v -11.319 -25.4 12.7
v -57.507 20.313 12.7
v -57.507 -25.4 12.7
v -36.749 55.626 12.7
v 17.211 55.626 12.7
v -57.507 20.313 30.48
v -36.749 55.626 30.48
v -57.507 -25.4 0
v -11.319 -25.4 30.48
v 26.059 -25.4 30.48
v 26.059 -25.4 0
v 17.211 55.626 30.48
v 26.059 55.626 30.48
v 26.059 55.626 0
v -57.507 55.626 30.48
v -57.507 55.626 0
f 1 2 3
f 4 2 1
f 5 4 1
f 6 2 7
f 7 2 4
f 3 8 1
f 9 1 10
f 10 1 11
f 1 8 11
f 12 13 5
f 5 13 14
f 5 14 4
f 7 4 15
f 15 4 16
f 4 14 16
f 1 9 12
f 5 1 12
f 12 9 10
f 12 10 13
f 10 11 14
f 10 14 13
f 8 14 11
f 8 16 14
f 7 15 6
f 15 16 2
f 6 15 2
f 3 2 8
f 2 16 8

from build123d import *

# Parameters (mm, degrees)
F0_W      = 50.8
F0_H      = 30.48
F1_DEPTH  = 25.4
F2_DEPTH  = 55.626
F3_DEPTH  = 32.766
F6_DEPTH  = 25.4
F7_DEPTH  = 25.4
F9_DEPTH  = 25.4
F10_DEPTH = 7.62


with BuildPart() as f1:
    # F0 (on Front) → F1 (new body)
    with BuildSketch(Plane.XZ):
        with Locations((-32.1067409651, 15.24)):
            Rectangle(F0_W, F0_H)
    extrude(amount=F1_DEPTH)

    # F2 (add): a face of the model
    f2_faces = [f1.faces().sort_by_distance(p)[0] for p in [
        (-32.1067409651, 0, 15.24),
    ]]
    extrude(f2_faces, amount=F2_DEPTH)

    # F3 (add): a face of the model
    f3_faces = [f1.faces().sort_by_distance(p)[0] for p in [
        (-6.7067409651, 15.113, 15.24),
    ]]
    extrude(f3_faces, amount=F3_DEPTH)

    # F4 (on face) → F6 (cut)
    with BuildSketch(Plane.XY.offset(30.48)):
        Polygon((-11.3192433491, -25.4), (17.2114539891, 55.626), (-57.5067409651, 55.626), (-57.5067409651, -25.4), align=None)
    extrude(amount=-F6_DEPTH, mode=Mode.SUBTRACT)

    # F5 (on face) → F7 (cut)
    with BuildSketch(Plane.XY.offset(30.48)):
        Polygon((-57.5067409651, -25.4), (-11.3192433491, -25.4), (17.2114539891, 55.626), (-43.2823600247, 55.626), (-57.5067409651, 55.626), align=None)
    extrude(amount=-F7_DEPTH, mode=Mode.SUBTRACT)

    # F8 (on face) → F9 (join)
    with BuildSketch(Plane.XY.offset(5.08)):
        Polygon((-57.5067409651, 20.3126166016), (-36.7487818003, 55.626), (-57.5067409651, 55.626), align=None)
    extrude(amount=F9_DEPTH)

    # F10 (add): a face of the model
    f10_faces = [f1.faces().sort_by_distance(p)[0] for p in [
        (-24.788870281, 16.2328343869, 5.08),
    ]]
    extrude(f10_faces, amount=F10_DEPTH)


solid = f1.part
